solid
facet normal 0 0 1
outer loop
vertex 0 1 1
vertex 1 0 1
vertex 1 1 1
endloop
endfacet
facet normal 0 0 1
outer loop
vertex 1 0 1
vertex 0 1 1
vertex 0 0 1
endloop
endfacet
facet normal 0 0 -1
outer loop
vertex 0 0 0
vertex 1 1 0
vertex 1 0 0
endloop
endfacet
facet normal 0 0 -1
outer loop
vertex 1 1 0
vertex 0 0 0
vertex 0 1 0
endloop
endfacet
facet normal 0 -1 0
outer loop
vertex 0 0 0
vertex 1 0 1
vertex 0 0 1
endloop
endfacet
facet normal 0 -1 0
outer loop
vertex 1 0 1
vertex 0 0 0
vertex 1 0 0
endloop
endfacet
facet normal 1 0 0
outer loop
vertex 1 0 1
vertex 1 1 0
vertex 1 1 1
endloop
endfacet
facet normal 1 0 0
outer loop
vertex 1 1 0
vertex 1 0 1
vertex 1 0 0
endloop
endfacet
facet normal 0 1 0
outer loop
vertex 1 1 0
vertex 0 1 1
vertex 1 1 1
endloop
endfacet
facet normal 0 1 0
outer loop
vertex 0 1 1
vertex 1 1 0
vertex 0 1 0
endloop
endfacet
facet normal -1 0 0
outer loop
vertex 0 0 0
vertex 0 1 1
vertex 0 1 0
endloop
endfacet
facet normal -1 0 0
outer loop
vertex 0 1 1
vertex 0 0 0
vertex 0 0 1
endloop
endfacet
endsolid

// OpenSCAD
// Test a mix of toplevel 2D and 3D objects
cube();
translate([2,0,0]) square();
